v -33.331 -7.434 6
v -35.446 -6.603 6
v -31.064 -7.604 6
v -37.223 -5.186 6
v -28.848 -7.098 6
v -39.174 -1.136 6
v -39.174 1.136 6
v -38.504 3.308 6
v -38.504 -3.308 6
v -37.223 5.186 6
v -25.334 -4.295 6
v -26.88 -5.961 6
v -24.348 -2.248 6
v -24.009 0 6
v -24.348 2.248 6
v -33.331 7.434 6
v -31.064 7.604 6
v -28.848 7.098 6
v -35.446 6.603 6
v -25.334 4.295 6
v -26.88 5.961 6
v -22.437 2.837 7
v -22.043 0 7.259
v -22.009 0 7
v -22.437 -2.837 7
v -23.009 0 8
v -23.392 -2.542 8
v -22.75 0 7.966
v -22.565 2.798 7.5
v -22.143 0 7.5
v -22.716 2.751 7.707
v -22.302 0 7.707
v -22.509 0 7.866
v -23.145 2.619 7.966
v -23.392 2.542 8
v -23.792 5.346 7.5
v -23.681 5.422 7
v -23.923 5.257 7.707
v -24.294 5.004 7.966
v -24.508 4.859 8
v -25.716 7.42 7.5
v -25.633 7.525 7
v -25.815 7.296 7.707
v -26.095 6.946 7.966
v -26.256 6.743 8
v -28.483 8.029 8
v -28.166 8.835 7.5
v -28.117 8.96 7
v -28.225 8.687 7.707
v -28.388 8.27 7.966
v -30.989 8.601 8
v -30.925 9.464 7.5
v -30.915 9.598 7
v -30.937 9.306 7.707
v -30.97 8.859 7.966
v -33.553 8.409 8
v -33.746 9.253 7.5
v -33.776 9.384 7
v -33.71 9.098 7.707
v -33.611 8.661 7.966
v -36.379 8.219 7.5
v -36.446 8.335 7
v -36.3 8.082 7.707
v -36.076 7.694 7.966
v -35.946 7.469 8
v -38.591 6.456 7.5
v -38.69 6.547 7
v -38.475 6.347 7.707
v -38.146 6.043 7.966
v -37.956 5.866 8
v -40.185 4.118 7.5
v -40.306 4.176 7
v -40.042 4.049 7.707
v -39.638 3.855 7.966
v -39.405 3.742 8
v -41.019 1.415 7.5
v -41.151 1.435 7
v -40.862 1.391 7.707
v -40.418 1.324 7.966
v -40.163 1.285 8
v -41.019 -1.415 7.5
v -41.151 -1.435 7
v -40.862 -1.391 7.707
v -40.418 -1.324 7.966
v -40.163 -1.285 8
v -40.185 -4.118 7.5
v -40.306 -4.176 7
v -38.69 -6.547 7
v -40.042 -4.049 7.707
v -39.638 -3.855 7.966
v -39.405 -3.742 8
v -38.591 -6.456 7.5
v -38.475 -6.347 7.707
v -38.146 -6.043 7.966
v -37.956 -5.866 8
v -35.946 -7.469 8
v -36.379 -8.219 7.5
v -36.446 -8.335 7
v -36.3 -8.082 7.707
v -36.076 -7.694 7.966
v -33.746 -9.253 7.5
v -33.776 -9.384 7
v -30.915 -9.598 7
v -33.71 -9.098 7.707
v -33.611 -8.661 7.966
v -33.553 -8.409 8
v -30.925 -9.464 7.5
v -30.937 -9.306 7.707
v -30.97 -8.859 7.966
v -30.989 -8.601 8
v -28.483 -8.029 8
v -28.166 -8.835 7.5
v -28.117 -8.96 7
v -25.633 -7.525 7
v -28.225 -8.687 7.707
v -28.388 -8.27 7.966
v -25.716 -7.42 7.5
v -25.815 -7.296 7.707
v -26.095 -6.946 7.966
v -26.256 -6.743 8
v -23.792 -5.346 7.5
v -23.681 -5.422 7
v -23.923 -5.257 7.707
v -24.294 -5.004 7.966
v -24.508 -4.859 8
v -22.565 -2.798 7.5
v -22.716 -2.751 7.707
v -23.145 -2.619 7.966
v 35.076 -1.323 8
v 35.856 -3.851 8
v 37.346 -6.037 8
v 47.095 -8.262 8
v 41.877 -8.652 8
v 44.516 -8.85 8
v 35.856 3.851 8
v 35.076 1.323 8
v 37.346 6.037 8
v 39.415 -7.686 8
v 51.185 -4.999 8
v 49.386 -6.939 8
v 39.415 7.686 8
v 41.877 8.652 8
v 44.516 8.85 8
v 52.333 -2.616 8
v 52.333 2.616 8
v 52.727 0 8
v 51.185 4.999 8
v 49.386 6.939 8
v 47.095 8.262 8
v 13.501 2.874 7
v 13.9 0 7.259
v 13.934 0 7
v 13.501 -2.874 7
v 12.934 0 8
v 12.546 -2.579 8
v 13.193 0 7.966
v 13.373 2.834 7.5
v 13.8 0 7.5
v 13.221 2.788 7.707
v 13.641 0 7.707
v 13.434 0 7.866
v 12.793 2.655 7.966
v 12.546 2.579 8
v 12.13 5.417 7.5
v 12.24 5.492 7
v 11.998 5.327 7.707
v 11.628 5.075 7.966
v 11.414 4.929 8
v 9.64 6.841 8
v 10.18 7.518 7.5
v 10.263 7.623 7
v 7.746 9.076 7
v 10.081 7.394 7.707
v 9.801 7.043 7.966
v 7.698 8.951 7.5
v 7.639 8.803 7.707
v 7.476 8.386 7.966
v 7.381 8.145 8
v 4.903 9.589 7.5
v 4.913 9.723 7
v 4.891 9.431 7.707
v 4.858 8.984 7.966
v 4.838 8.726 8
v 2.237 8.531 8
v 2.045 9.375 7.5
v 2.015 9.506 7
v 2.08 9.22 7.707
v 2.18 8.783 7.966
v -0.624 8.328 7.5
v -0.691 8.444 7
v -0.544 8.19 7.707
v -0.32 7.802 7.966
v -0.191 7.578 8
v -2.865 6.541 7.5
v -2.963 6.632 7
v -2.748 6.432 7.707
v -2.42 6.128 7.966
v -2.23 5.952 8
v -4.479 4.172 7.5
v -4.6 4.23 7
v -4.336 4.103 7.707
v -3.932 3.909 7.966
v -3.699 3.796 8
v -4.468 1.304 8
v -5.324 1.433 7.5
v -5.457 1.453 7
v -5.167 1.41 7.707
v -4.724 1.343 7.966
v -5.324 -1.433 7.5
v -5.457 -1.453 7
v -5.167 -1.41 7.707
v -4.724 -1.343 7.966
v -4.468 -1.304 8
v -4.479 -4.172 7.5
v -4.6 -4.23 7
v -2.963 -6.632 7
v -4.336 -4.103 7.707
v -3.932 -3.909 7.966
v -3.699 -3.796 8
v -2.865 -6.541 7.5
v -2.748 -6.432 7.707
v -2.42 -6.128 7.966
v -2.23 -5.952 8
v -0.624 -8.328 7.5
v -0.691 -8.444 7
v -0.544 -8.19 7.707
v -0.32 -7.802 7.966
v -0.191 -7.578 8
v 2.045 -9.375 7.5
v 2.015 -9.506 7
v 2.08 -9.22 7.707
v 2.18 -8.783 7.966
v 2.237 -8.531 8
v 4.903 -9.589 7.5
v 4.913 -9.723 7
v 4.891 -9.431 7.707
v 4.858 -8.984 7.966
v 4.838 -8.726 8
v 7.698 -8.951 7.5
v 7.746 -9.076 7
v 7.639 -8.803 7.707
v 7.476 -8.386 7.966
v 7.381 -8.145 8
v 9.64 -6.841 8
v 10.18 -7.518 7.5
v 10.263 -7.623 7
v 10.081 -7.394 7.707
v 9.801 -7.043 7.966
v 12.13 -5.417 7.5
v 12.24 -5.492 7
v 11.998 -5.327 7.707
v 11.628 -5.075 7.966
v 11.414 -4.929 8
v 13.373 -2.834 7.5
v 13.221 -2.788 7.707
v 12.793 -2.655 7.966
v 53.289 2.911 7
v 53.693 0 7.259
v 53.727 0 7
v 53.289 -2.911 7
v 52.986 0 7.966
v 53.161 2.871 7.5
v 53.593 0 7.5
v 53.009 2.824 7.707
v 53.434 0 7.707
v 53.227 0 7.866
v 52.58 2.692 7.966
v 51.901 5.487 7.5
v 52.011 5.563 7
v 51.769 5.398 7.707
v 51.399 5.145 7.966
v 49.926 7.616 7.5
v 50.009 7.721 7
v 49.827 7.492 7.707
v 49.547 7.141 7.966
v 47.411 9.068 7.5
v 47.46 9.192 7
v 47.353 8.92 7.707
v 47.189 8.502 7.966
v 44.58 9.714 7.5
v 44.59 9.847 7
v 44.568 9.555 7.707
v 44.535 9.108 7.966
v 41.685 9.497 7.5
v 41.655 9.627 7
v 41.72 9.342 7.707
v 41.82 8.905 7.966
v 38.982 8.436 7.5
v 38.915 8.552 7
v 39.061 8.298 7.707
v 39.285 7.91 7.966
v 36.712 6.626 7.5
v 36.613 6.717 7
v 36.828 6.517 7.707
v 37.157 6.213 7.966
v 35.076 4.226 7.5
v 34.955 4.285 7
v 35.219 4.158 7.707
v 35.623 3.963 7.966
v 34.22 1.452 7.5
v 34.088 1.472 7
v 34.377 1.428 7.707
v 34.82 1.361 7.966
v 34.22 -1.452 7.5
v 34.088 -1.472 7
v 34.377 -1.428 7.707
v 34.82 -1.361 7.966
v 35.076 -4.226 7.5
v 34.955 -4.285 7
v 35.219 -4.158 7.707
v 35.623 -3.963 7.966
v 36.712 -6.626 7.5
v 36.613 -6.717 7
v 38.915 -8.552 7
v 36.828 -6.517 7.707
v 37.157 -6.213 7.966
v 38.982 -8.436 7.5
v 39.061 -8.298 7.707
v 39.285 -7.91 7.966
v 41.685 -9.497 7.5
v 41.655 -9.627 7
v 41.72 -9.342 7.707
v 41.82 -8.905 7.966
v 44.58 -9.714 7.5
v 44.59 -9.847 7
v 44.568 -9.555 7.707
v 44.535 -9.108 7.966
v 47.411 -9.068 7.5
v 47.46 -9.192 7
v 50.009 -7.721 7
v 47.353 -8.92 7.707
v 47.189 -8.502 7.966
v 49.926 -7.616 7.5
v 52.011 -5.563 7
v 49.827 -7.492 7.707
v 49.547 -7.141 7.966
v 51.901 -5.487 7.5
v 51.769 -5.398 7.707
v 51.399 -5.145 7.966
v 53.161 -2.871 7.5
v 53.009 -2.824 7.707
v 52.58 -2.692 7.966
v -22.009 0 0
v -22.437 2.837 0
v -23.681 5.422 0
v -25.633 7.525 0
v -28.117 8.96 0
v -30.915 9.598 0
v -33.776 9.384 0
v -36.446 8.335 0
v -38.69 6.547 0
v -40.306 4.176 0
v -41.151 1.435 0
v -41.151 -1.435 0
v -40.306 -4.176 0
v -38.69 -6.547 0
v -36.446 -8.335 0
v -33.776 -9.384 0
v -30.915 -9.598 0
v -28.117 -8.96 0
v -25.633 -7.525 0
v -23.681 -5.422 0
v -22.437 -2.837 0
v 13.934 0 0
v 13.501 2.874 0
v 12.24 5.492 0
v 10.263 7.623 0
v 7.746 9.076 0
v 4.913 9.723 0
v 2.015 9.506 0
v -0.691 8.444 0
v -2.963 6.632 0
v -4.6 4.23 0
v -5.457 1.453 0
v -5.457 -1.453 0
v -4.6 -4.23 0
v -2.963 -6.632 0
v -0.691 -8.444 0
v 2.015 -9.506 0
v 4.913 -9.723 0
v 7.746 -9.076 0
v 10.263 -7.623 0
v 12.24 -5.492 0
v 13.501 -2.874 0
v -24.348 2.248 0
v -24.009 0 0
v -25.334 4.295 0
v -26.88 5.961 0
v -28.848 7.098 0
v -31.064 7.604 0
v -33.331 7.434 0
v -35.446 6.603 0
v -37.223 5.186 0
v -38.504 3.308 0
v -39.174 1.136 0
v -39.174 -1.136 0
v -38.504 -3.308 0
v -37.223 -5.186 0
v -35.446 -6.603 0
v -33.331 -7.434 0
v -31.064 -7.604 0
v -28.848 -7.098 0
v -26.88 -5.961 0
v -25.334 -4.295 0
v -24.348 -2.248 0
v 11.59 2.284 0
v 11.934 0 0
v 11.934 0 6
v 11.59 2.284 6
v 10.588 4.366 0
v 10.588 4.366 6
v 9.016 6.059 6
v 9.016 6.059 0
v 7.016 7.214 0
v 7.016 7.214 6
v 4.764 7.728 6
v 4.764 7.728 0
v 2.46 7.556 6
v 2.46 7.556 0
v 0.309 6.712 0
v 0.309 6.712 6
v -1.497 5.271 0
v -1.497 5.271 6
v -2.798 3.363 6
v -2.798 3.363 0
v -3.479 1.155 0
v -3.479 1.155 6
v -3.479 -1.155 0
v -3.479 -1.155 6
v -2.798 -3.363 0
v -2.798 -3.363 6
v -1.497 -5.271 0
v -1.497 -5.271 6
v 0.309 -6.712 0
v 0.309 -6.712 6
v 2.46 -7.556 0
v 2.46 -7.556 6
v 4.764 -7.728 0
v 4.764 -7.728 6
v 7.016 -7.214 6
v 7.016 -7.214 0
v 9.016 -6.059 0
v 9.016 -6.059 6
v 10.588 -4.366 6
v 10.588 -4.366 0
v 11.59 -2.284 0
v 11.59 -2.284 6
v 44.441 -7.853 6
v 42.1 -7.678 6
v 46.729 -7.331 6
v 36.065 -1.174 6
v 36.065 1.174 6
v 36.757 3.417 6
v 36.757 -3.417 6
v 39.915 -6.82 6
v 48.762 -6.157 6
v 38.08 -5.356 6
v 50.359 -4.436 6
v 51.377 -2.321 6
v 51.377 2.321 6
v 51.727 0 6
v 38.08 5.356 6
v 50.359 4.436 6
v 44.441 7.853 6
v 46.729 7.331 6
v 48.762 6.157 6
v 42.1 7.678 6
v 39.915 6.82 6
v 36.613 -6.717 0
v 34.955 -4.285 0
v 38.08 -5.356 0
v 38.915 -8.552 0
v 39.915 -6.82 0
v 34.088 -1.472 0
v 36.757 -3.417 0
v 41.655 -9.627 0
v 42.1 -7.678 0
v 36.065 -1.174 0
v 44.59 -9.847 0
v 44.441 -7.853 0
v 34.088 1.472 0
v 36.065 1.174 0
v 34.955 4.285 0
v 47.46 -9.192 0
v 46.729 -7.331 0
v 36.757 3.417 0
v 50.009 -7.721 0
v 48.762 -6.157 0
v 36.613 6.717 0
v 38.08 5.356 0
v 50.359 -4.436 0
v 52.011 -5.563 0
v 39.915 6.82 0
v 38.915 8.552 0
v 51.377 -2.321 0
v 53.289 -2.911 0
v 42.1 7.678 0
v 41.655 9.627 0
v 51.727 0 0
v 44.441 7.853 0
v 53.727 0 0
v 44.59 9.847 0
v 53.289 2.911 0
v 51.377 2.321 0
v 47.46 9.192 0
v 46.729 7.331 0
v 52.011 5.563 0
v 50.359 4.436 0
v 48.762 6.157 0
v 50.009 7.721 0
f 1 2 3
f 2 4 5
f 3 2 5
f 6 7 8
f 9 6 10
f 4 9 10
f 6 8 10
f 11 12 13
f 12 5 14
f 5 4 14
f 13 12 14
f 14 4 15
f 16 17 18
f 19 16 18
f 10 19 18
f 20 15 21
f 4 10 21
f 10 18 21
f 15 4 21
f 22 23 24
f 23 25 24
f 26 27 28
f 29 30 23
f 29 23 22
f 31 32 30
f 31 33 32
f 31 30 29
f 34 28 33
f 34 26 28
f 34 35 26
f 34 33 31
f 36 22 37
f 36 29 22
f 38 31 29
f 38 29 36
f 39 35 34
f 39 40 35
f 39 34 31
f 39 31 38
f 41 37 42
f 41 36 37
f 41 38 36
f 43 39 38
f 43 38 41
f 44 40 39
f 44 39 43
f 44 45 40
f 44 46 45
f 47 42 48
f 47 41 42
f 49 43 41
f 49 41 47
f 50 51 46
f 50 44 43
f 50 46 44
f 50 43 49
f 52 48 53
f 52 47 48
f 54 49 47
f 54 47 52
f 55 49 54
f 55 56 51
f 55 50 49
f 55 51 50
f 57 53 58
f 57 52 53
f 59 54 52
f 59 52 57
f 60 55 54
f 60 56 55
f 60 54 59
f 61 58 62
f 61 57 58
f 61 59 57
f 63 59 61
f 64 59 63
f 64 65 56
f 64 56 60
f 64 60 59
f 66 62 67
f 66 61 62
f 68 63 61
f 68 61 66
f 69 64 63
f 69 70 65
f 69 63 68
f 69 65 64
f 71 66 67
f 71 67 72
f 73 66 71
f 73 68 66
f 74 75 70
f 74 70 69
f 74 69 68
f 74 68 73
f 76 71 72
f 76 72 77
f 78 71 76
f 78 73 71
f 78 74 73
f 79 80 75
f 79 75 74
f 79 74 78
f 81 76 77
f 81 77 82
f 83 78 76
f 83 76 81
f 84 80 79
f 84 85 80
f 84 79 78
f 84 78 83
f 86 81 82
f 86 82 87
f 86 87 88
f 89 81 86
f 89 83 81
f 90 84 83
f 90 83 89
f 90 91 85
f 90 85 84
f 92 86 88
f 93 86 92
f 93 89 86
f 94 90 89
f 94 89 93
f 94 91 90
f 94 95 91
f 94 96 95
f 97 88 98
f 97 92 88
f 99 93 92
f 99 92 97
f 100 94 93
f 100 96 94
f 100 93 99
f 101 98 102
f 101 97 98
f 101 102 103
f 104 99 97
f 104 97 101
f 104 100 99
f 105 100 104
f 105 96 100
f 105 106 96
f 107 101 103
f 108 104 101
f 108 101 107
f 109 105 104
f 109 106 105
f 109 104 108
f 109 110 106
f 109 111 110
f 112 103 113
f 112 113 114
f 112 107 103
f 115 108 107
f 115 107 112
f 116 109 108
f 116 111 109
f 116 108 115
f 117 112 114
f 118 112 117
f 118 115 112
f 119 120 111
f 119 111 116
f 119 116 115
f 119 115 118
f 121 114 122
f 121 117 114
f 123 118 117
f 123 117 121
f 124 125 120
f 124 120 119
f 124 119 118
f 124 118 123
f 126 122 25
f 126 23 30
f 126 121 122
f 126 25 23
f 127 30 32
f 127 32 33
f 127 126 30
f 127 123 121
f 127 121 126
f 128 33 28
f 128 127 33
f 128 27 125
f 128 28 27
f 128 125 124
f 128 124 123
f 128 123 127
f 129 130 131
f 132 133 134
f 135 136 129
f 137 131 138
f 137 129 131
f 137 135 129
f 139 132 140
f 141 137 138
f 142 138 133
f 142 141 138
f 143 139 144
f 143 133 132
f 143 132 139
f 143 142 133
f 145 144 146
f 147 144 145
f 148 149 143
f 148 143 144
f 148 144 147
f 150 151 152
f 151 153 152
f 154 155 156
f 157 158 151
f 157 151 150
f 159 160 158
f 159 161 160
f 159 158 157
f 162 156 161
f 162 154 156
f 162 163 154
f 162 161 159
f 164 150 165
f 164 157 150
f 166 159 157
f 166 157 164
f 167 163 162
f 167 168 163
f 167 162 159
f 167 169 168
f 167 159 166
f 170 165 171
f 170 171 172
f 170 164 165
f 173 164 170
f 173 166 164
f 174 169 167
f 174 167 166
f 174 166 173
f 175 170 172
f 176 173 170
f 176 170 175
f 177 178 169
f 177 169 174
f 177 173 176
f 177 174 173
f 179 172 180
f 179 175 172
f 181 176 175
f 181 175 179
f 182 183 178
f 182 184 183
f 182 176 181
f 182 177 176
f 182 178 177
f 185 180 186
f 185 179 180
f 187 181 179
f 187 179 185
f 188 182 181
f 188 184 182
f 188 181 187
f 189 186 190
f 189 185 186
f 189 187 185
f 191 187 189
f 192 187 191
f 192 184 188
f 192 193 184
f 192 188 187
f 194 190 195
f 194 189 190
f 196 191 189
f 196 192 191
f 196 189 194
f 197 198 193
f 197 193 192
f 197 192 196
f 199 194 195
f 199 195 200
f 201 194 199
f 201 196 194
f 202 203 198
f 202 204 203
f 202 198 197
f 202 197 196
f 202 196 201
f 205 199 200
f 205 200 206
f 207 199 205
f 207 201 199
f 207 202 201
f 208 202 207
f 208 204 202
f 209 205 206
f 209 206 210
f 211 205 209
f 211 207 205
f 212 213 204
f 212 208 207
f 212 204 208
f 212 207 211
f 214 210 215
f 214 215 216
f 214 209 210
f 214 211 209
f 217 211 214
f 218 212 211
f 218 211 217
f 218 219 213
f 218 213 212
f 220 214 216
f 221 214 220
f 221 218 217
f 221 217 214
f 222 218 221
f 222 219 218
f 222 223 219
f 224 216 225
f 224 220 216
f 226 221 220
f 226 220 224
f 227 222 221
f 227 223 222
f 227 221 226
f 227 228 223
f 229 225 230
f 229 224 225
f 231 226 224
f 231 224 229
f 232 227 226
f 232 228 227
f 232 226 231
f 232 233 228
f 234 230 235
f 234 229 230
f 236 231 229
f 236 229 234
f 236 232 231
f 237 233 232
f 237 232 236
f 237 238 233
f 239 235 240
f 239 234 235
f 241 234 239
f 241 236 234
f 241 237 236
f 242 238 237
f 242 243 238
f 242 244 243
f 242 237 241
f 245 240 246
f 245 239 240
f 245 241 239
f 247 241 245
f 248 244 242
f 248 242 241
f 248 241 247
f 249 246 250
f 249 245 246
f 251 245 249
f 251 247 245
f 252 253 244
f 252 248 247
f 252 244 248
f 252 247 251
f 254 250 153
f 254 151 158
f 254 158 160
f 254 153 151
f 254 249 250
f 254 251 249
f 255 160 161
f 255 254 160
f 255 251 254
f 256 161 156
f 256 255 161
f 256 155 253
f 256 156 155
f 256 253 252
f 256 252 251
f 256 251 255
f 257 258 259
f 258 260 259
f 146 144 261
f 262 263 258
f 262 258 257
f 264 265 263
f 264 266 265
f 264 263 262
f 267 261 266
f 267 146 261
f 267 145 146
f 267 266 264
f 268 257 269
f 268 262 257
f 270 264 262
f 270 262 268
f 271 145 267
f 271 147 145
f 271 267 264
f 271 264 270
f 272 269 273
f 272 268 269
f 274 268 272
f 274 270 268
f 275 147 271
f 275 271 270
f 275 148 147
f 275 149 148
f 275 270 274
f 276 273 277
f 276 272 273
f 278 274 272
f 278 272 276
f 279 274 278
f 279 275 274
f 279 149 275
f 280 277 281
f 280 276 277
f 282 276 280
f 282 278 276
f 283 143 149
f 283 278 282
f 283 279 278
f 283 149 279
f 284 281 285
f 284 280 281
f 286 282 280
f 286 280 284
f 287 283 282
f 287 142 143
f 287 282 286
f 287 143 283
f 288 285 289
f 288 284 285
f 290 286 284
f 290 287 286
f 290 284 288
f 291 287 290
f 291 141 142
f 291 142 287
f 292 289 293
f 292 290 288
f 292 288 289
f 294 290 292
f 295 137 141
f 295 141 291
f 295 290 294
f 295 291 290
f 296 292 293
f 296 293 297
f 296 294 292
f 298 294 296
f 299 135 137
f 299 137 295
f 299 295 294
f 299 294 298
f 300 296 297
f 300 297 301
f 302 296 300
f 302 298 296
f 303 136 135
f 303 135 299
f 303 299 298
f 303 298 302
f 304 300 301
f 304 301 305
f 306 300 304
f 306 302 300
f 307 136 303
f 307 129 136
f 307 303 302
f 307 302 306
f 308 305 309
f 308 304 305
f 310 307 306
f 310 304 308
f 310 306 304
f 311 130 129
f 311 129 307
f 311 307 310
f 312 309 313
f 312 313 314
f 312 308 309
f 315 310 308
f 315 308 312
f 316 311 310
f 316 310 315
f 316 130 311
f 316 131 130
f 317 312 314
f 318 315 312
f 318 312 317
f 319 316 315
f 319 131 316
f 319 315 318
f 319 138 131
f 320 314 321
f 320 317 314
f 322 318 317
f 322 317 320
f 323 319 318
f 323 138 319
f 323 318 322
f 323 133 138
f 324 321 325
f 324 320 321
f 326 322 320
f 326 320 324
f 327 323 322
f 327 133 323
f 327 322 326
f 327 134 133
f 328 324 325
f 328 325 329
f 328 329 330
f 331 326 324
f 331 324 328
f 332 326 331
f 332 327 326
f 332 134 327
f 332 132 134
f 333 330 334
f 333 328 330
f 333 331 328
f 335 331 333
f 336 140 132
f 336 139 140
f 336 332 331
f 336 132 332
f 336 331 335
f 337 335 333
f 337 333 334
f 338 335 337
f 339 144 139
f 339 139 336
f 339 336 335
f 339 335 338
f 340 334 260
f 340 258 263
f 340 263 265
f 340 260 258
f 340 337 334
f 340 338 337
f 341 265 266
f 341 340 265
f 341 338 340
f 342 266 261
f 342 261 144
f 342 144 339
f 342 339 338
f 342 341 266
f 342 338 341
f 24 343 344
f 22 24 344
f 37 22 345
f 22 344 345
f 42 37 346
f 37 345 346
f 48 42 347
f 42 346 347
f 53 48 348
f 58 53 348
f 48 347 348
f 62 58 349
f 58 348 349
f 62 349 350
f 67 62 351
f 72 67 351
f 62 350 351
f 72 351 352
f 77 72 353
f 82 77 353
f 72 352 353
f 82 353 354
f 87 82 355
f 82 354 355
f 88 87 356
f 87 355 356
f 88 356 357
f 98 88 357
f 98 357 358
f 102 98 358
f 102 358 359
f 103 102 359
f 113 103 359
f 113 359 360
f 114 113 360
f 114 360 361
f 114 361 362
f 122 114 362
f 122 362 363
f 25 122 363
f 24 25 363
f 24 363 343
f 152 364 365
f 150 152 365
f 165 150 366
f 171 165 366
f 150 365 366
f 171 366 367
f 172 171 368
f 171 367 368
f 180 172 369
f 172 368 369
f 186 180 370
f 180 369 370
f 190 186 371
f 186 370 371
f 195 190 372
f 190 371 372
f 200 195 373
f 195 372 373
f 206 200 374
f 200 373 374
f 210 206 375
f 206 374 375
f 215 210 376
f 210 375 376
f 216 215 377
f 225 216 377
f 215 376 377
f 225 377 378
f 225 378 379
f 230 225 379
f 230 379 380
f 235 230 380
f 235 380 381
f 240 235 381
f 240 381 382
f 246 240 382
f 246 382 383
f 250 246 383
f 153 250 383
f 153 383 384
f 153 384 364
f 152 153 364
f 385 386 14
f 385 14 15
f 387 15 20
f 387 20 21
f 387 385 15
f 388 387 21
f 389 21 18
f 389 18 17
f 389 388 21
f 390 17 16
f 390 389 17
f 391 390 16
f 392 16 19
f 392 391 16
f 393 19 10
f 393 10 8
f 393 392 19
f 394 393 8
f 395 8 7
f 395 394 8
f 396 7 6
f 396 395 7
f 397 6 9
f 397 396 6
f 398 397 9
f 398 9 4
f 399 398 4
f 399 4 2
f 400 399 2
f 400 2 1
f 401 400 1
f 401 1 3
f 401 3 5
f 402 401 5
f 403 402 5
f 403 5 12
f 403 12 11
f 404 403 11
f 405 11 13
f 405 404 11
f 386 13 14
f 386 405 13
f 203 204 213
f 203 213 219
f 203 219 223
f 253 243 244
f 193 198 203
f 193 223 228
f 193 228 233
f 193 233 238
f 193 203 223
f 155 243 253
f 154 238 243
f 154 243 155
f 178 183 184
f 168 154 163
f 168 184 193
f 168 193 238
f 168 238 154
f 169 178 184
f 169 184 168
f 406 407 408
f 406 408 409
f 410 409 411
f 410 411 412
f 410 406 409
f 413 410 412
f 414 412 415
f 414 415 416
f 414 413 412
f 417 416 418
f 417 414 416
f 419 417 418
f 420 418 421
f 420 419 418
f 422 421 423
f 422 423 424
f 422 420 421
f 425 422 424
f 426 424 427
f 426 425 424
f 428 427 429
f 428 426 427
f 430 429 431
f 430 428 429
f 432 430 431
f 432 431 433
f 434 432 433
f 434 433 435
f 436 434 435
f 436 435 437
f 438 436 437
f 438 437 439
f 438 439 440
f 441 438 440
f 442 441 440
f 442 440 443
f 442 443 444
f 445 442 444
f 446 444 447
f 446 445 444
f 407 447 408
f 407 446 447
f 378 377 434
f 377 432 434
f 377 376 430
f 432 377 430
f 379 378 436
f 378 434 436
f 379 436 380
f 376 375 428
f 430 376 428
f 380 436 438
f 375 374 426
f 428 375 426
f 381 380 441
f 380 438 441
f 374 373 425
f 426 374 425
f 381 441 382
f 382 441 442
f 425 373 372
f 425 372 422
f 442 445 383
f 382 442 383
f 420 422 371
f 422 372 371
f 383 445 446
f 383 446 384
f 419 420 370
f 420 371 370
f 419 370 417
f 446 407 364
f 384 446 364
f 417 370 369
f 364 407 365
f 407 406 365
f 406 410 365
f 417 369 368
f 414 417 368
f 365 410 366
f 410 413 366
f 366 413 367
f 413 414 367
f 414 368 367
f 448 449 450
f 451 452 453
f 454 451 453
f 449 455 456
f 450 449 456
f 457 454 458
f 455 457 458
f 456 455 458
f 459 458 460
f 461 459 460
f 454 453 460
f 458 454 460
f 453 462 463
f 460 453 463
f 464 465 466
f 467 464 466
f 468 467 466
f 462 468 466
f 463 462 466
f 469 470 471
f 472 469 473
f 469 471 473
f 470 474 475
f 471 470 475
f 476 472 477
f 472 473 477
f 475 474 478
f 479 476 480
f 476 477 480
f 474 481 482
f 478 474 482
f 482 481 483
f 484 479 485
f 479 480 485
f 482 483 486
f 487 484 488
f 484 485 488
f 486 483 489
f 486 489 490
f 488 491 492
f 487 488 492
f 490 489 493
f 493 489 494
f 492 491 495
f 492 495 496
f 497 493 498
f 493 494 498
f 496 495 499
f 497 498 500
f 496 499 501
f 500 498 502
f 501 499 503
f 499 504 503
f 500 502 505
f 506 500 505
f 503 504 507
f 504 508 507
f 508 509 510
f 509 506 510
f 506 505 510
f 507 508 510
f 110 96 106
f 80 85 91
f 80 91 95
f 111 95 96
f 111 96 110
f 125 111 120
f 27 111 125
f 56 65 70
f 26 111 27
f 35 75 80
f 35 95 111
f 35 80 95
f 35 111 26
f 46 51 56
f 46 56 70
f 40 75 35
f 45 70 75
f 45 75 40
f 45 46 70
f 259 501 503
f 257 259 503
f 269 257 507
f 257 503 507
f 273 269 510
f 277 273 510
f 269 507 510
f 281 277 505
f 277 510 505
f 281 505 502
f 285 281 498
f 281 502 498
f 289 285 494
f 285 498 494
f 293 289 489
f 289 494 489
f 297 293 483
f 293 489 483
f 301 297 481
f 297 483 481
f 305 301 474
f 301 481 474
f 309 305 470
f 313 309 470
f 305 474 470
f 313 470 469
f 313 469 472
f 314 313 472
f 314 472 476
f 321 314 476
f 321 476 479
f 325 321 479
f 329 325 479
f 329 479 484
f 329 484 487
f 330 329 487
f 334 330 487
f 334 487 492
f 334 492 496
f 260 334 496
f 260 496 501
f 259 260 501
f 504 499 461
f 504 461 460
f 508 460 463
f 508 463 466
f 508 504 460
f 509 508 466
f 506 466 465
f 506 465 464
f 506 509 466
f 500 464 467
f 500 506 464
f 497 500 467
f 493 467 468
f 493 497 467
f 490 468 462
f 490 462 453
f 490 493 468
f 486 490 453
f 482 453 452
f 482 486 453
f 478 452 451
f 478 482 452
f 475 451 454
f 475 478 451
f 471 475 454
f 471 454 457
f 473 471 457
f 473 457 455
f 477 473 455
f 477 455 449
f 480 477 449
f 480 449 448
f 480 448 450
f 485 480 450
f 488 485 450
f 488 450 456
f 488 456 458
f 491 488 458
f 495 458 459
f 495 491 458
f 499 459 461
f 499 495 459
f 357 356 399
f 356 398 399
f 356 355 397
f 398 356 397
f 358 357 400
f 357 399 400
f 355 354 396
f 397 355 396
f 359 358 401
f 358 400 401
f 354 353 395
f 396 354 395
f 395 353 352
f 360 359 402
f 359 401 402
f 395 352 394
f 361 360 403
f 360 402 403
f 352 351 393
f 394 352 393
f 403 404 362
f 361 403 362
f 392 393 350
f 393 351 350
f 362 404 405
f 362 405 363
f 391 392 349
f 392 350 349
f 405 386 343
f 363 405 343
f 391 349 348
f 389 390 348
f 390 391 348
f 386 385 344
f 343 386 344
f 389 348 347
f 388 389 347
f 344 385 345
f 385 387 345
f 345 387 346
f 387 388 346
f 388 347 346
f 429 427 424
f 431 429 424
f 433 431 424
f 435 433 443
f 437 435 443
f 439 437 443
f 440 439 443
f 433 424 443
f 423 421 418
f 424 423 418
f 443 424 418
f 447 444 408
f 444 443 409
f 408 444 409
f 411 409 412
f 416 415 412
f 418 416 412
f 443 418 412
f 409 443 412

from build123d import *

# Parameters (mm, degrees)
F0_R     = 9.625
F0_R_2   = 7.625
F0_R_3   = 9.75
F0_R_4   = 7.75
F0_R_5   = 9.875
F0_R_6   = 7.875
F1_DEPTH = 6
F2_R     = 9.625
F2_R_2   = 9.75
F2_R_3   = 9.875
F3_DEPTH = 2
F4_R     = 1


with BuildPart() as f1:
    # F0 (on Top) → F1 (new body)
    with BuildSketch(Plane.XY):
        with Locations((-31.633902, 0)):
            Circle(F0_R)
        with Locations((-31.633902, 0)):
            Circle(F0_R_2, mode=Mode.SUBTRACT)
        with Locations((4.184379, 0)):
            Circle(F0_R_3)
        with Locations((4.184379, 0)):
            Circle(F0_R_4, mode=Mode.SUBTRACT)
        with Locations((43.852288, 0)):
            Circle(F0_R_5)
        with Locations((43.852288, 0)):
            Circle(F0_R_6, mode=Mode.SUBTRACT)
    extrude(amount=F1_DEPTH)

    # F2 (on face) → F3 (join)
    with BuildSketch(Plane.XY.offset(6)):
        with Locations((-31.633902, 0)):
            Circle(F2_R)
        with Locations((4.184379, 0)):
            Circle(F2_R_2)
        with Locations((43.852288, 0)):
            Circle(F2_R_3)
    extrude(amount=F3_DEPTH)

    # F4
    f4_edges = [f1.edges().sort_by_distance(p)[0] for p in [
        (-41.258902, 0, 8),
        (-5.565621, 0, 8),
        (33.977288, 0, 8),
    ]]
    fillet(f4_edges, radius=F4_R)


solid = f1.part
